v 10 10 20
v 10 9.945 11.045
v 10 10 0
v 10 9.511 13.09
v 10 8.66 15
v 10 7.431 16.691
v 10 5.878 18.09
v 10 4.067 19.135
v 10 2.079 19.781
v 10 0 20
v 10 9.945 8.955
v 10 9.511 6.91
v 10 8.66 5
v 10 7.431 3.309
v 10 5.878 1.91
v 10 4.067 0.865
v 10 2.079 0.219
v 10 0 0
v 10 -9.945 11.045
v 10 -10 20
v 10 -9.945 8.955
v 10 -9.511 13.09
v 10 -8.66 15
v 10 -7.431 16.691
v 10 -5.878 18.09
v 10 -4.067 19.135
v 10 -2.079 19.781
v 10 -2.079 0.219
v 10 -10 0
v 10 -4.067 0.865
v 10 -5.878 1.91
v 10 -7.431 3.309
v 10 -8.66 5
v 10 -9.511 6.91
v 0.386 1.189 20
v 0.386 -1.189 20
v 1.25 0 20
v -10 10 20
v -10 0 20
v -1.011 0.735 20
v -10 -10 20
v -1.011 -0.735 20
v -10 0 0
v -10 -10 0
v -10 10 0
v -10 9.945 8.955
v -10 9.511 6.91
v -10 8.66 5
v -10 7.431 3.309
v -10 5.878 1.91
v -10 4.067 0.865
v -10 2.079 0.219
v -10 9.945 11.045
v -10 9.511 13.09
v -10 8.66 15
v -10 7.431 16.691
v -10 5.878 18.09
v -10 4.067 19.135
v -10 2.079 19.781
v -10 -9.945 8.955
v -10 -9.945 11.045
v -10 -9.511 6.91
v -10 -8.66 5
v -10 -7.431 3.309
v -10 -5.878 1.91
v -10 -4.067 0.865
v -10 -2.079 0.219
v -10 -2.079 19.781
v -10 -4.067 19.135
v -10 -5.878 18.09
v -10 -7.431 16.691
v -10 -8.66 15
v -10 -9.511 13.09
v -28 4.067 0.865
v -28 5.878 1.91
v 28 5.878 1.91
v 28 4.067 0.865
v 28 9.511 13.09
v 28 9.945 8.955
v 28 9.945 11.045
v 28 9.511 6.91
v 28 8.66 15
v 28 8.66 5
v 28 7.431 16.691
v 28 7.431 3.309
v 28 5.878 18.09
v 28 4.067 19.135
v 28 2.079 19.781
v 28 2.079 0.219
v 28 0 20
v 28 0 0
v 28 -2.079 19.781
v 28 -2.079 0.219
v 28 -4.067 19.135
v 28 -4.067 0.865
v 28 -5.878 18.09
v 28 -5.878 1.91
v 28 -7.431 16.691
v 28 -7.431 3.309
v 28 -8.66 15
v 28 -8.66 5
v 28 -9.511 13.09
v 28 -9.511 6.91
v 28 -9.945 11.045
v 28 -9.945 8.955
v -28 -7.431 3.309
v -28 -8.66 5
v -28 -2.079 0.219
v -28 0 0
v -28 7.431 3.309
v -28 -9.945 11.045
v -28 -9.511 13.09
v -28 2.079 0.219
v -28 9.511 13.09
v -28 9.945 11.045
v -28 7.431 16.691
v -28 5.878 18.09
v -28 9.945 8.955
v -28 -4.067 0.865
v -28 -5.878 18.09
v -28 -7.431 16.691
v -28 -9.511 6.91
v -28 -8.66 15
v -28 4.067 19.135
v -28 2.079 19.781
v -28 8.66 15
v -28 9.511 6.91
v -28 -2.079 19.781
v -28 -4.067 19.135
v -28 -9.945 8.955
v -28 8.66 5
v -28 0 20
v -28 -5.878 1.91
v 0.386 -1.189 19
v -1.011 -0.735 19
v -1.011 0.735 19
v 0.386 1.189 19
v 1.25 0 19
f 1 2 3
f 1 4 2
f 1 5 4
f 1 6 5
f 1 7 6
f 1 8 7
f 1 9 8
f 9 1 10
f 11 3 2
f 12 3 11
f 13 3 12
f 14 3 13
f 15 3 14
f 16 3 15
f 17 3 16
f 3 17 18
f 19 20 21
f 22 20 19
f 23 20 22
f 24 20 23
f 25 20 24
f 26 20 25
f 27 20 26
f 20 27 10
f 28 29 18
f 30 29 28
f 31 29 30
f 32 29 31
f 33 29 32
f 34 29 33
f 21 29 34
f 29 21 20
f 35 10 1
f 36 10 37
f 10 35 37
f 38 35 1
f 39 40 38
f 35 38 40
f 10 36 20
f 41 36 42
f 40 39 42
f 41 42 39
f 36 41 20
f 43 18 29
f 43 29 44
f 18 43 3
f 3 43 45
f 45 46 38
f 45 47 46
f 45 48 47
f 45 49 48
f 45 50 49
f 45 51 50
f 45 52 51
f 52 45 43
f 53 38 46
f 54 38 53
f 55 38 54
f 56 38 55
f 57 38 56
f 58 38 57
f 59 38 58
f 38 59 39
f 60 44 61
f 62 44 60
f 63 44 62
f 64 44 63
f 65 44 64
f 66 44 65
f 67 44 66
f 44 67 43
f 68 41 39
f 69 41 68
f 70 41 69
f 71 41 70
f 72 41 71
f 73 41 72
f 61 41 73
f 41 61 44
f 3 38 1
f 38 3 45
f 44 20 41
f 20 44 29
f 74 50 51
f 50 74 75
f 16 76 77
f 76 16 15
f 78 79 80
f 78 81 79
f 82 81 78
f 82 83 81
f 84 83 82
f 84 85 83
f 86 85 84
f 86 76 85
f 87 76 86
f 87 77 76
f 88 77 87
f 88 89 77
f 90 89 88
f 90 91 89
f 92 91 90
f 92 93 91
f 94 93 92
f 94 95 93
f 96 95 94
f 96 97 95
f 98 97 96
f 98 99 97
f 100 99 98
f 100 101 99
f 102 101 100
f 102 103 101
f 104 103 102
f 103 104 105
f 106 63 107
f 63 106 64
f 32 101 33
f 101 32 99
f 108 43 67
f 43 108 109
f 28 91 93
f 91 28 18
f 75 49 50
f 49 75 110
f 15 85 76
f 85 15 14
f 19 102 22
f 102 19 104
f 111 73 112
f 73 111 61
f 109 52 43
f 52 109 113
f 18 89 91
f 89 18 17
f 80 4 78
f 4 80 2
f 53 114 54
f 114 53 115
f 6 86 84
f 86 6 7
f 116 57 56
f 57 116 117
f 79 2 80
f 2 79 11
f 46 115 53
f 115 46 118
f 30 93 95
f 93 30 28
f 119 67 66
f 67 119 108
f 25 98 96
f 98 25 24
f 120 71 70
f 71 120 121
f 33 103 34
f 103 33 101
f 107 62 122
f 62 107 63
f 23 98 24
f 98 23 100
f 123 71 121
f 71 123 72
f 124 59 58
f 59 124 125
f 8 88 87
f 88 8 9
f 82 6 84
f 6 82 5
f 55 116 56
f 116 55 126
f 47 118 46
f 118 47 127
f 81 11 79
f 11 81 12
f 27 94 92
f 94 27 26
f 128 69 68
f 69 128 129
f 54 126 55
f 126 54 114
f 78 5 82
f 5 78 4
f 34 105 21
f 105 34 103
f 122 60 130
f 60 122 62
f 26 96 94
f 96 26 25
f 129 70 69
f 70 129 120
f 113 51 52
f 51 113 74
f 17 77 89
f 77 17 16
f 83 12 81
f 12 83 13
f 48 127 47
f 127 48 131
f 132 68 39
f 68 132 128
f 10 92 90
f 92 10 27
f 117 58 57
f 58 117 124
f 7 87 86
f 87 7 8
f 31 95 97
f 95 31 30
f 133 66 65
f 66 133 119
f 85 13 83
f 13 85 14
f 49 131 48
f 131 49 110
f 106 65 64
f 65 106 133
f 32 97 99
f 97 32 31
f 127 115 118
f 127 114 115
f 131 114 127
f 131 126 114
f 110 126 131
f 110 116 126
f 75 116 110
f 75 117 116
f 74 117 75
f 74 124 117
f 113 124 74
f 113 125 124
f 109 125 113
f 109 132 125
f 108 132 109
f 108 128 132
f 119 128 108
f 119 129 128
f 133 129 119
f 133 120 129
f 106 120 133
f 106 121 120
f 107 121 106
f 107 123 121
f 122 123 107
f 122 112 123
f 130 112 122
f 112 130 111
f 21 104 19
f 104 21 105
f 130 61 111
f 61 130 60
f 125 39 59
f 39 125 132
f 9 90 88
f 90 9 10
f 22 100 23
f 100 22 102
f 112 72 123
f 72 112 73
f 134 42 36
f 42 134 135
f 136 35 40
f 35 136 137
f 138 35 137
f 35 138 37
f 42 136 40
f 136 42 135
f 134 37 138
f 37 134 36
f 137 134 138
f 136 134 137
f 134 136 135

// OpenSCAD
cube_size = 20; // [10:Small,20:Medium,30:Large]

hole_diameter = 2.5; 
hole_radius = hole_diameter/2;

// How deep should the center hole be?
hole_depth = 1; // [0,1,5,50]

show_wheels = "yes"; // [yes,no]

// How thick should the side wheels be?
wheel_thickness = 18; // [1:40]

// ignore this variable!
// foo=1;

// don't turn functions into params!
function BEZ03(u) = pow((1-u), 3);

// ignore variable values
bing = 3+4;
baz = 3 / hole_depth;

difference() {
  union() {
    translate([0, 0, cube_size/2]) cube([cube_size,cube_size,cube_size], center=true);
    if (show_wheels == "yes") {
      translate([0, 0, cube_size/2]) rotate([0, 90, 0]) {
        cylinder(r=cube_size/2, h=cube_size+(wheel_thickness*2), center=true);
      }
    }
  }
  translate([0, 0, cube_size-hole_depth]) cylinder(r=hole_radius, h=hole_depth);
}
        
